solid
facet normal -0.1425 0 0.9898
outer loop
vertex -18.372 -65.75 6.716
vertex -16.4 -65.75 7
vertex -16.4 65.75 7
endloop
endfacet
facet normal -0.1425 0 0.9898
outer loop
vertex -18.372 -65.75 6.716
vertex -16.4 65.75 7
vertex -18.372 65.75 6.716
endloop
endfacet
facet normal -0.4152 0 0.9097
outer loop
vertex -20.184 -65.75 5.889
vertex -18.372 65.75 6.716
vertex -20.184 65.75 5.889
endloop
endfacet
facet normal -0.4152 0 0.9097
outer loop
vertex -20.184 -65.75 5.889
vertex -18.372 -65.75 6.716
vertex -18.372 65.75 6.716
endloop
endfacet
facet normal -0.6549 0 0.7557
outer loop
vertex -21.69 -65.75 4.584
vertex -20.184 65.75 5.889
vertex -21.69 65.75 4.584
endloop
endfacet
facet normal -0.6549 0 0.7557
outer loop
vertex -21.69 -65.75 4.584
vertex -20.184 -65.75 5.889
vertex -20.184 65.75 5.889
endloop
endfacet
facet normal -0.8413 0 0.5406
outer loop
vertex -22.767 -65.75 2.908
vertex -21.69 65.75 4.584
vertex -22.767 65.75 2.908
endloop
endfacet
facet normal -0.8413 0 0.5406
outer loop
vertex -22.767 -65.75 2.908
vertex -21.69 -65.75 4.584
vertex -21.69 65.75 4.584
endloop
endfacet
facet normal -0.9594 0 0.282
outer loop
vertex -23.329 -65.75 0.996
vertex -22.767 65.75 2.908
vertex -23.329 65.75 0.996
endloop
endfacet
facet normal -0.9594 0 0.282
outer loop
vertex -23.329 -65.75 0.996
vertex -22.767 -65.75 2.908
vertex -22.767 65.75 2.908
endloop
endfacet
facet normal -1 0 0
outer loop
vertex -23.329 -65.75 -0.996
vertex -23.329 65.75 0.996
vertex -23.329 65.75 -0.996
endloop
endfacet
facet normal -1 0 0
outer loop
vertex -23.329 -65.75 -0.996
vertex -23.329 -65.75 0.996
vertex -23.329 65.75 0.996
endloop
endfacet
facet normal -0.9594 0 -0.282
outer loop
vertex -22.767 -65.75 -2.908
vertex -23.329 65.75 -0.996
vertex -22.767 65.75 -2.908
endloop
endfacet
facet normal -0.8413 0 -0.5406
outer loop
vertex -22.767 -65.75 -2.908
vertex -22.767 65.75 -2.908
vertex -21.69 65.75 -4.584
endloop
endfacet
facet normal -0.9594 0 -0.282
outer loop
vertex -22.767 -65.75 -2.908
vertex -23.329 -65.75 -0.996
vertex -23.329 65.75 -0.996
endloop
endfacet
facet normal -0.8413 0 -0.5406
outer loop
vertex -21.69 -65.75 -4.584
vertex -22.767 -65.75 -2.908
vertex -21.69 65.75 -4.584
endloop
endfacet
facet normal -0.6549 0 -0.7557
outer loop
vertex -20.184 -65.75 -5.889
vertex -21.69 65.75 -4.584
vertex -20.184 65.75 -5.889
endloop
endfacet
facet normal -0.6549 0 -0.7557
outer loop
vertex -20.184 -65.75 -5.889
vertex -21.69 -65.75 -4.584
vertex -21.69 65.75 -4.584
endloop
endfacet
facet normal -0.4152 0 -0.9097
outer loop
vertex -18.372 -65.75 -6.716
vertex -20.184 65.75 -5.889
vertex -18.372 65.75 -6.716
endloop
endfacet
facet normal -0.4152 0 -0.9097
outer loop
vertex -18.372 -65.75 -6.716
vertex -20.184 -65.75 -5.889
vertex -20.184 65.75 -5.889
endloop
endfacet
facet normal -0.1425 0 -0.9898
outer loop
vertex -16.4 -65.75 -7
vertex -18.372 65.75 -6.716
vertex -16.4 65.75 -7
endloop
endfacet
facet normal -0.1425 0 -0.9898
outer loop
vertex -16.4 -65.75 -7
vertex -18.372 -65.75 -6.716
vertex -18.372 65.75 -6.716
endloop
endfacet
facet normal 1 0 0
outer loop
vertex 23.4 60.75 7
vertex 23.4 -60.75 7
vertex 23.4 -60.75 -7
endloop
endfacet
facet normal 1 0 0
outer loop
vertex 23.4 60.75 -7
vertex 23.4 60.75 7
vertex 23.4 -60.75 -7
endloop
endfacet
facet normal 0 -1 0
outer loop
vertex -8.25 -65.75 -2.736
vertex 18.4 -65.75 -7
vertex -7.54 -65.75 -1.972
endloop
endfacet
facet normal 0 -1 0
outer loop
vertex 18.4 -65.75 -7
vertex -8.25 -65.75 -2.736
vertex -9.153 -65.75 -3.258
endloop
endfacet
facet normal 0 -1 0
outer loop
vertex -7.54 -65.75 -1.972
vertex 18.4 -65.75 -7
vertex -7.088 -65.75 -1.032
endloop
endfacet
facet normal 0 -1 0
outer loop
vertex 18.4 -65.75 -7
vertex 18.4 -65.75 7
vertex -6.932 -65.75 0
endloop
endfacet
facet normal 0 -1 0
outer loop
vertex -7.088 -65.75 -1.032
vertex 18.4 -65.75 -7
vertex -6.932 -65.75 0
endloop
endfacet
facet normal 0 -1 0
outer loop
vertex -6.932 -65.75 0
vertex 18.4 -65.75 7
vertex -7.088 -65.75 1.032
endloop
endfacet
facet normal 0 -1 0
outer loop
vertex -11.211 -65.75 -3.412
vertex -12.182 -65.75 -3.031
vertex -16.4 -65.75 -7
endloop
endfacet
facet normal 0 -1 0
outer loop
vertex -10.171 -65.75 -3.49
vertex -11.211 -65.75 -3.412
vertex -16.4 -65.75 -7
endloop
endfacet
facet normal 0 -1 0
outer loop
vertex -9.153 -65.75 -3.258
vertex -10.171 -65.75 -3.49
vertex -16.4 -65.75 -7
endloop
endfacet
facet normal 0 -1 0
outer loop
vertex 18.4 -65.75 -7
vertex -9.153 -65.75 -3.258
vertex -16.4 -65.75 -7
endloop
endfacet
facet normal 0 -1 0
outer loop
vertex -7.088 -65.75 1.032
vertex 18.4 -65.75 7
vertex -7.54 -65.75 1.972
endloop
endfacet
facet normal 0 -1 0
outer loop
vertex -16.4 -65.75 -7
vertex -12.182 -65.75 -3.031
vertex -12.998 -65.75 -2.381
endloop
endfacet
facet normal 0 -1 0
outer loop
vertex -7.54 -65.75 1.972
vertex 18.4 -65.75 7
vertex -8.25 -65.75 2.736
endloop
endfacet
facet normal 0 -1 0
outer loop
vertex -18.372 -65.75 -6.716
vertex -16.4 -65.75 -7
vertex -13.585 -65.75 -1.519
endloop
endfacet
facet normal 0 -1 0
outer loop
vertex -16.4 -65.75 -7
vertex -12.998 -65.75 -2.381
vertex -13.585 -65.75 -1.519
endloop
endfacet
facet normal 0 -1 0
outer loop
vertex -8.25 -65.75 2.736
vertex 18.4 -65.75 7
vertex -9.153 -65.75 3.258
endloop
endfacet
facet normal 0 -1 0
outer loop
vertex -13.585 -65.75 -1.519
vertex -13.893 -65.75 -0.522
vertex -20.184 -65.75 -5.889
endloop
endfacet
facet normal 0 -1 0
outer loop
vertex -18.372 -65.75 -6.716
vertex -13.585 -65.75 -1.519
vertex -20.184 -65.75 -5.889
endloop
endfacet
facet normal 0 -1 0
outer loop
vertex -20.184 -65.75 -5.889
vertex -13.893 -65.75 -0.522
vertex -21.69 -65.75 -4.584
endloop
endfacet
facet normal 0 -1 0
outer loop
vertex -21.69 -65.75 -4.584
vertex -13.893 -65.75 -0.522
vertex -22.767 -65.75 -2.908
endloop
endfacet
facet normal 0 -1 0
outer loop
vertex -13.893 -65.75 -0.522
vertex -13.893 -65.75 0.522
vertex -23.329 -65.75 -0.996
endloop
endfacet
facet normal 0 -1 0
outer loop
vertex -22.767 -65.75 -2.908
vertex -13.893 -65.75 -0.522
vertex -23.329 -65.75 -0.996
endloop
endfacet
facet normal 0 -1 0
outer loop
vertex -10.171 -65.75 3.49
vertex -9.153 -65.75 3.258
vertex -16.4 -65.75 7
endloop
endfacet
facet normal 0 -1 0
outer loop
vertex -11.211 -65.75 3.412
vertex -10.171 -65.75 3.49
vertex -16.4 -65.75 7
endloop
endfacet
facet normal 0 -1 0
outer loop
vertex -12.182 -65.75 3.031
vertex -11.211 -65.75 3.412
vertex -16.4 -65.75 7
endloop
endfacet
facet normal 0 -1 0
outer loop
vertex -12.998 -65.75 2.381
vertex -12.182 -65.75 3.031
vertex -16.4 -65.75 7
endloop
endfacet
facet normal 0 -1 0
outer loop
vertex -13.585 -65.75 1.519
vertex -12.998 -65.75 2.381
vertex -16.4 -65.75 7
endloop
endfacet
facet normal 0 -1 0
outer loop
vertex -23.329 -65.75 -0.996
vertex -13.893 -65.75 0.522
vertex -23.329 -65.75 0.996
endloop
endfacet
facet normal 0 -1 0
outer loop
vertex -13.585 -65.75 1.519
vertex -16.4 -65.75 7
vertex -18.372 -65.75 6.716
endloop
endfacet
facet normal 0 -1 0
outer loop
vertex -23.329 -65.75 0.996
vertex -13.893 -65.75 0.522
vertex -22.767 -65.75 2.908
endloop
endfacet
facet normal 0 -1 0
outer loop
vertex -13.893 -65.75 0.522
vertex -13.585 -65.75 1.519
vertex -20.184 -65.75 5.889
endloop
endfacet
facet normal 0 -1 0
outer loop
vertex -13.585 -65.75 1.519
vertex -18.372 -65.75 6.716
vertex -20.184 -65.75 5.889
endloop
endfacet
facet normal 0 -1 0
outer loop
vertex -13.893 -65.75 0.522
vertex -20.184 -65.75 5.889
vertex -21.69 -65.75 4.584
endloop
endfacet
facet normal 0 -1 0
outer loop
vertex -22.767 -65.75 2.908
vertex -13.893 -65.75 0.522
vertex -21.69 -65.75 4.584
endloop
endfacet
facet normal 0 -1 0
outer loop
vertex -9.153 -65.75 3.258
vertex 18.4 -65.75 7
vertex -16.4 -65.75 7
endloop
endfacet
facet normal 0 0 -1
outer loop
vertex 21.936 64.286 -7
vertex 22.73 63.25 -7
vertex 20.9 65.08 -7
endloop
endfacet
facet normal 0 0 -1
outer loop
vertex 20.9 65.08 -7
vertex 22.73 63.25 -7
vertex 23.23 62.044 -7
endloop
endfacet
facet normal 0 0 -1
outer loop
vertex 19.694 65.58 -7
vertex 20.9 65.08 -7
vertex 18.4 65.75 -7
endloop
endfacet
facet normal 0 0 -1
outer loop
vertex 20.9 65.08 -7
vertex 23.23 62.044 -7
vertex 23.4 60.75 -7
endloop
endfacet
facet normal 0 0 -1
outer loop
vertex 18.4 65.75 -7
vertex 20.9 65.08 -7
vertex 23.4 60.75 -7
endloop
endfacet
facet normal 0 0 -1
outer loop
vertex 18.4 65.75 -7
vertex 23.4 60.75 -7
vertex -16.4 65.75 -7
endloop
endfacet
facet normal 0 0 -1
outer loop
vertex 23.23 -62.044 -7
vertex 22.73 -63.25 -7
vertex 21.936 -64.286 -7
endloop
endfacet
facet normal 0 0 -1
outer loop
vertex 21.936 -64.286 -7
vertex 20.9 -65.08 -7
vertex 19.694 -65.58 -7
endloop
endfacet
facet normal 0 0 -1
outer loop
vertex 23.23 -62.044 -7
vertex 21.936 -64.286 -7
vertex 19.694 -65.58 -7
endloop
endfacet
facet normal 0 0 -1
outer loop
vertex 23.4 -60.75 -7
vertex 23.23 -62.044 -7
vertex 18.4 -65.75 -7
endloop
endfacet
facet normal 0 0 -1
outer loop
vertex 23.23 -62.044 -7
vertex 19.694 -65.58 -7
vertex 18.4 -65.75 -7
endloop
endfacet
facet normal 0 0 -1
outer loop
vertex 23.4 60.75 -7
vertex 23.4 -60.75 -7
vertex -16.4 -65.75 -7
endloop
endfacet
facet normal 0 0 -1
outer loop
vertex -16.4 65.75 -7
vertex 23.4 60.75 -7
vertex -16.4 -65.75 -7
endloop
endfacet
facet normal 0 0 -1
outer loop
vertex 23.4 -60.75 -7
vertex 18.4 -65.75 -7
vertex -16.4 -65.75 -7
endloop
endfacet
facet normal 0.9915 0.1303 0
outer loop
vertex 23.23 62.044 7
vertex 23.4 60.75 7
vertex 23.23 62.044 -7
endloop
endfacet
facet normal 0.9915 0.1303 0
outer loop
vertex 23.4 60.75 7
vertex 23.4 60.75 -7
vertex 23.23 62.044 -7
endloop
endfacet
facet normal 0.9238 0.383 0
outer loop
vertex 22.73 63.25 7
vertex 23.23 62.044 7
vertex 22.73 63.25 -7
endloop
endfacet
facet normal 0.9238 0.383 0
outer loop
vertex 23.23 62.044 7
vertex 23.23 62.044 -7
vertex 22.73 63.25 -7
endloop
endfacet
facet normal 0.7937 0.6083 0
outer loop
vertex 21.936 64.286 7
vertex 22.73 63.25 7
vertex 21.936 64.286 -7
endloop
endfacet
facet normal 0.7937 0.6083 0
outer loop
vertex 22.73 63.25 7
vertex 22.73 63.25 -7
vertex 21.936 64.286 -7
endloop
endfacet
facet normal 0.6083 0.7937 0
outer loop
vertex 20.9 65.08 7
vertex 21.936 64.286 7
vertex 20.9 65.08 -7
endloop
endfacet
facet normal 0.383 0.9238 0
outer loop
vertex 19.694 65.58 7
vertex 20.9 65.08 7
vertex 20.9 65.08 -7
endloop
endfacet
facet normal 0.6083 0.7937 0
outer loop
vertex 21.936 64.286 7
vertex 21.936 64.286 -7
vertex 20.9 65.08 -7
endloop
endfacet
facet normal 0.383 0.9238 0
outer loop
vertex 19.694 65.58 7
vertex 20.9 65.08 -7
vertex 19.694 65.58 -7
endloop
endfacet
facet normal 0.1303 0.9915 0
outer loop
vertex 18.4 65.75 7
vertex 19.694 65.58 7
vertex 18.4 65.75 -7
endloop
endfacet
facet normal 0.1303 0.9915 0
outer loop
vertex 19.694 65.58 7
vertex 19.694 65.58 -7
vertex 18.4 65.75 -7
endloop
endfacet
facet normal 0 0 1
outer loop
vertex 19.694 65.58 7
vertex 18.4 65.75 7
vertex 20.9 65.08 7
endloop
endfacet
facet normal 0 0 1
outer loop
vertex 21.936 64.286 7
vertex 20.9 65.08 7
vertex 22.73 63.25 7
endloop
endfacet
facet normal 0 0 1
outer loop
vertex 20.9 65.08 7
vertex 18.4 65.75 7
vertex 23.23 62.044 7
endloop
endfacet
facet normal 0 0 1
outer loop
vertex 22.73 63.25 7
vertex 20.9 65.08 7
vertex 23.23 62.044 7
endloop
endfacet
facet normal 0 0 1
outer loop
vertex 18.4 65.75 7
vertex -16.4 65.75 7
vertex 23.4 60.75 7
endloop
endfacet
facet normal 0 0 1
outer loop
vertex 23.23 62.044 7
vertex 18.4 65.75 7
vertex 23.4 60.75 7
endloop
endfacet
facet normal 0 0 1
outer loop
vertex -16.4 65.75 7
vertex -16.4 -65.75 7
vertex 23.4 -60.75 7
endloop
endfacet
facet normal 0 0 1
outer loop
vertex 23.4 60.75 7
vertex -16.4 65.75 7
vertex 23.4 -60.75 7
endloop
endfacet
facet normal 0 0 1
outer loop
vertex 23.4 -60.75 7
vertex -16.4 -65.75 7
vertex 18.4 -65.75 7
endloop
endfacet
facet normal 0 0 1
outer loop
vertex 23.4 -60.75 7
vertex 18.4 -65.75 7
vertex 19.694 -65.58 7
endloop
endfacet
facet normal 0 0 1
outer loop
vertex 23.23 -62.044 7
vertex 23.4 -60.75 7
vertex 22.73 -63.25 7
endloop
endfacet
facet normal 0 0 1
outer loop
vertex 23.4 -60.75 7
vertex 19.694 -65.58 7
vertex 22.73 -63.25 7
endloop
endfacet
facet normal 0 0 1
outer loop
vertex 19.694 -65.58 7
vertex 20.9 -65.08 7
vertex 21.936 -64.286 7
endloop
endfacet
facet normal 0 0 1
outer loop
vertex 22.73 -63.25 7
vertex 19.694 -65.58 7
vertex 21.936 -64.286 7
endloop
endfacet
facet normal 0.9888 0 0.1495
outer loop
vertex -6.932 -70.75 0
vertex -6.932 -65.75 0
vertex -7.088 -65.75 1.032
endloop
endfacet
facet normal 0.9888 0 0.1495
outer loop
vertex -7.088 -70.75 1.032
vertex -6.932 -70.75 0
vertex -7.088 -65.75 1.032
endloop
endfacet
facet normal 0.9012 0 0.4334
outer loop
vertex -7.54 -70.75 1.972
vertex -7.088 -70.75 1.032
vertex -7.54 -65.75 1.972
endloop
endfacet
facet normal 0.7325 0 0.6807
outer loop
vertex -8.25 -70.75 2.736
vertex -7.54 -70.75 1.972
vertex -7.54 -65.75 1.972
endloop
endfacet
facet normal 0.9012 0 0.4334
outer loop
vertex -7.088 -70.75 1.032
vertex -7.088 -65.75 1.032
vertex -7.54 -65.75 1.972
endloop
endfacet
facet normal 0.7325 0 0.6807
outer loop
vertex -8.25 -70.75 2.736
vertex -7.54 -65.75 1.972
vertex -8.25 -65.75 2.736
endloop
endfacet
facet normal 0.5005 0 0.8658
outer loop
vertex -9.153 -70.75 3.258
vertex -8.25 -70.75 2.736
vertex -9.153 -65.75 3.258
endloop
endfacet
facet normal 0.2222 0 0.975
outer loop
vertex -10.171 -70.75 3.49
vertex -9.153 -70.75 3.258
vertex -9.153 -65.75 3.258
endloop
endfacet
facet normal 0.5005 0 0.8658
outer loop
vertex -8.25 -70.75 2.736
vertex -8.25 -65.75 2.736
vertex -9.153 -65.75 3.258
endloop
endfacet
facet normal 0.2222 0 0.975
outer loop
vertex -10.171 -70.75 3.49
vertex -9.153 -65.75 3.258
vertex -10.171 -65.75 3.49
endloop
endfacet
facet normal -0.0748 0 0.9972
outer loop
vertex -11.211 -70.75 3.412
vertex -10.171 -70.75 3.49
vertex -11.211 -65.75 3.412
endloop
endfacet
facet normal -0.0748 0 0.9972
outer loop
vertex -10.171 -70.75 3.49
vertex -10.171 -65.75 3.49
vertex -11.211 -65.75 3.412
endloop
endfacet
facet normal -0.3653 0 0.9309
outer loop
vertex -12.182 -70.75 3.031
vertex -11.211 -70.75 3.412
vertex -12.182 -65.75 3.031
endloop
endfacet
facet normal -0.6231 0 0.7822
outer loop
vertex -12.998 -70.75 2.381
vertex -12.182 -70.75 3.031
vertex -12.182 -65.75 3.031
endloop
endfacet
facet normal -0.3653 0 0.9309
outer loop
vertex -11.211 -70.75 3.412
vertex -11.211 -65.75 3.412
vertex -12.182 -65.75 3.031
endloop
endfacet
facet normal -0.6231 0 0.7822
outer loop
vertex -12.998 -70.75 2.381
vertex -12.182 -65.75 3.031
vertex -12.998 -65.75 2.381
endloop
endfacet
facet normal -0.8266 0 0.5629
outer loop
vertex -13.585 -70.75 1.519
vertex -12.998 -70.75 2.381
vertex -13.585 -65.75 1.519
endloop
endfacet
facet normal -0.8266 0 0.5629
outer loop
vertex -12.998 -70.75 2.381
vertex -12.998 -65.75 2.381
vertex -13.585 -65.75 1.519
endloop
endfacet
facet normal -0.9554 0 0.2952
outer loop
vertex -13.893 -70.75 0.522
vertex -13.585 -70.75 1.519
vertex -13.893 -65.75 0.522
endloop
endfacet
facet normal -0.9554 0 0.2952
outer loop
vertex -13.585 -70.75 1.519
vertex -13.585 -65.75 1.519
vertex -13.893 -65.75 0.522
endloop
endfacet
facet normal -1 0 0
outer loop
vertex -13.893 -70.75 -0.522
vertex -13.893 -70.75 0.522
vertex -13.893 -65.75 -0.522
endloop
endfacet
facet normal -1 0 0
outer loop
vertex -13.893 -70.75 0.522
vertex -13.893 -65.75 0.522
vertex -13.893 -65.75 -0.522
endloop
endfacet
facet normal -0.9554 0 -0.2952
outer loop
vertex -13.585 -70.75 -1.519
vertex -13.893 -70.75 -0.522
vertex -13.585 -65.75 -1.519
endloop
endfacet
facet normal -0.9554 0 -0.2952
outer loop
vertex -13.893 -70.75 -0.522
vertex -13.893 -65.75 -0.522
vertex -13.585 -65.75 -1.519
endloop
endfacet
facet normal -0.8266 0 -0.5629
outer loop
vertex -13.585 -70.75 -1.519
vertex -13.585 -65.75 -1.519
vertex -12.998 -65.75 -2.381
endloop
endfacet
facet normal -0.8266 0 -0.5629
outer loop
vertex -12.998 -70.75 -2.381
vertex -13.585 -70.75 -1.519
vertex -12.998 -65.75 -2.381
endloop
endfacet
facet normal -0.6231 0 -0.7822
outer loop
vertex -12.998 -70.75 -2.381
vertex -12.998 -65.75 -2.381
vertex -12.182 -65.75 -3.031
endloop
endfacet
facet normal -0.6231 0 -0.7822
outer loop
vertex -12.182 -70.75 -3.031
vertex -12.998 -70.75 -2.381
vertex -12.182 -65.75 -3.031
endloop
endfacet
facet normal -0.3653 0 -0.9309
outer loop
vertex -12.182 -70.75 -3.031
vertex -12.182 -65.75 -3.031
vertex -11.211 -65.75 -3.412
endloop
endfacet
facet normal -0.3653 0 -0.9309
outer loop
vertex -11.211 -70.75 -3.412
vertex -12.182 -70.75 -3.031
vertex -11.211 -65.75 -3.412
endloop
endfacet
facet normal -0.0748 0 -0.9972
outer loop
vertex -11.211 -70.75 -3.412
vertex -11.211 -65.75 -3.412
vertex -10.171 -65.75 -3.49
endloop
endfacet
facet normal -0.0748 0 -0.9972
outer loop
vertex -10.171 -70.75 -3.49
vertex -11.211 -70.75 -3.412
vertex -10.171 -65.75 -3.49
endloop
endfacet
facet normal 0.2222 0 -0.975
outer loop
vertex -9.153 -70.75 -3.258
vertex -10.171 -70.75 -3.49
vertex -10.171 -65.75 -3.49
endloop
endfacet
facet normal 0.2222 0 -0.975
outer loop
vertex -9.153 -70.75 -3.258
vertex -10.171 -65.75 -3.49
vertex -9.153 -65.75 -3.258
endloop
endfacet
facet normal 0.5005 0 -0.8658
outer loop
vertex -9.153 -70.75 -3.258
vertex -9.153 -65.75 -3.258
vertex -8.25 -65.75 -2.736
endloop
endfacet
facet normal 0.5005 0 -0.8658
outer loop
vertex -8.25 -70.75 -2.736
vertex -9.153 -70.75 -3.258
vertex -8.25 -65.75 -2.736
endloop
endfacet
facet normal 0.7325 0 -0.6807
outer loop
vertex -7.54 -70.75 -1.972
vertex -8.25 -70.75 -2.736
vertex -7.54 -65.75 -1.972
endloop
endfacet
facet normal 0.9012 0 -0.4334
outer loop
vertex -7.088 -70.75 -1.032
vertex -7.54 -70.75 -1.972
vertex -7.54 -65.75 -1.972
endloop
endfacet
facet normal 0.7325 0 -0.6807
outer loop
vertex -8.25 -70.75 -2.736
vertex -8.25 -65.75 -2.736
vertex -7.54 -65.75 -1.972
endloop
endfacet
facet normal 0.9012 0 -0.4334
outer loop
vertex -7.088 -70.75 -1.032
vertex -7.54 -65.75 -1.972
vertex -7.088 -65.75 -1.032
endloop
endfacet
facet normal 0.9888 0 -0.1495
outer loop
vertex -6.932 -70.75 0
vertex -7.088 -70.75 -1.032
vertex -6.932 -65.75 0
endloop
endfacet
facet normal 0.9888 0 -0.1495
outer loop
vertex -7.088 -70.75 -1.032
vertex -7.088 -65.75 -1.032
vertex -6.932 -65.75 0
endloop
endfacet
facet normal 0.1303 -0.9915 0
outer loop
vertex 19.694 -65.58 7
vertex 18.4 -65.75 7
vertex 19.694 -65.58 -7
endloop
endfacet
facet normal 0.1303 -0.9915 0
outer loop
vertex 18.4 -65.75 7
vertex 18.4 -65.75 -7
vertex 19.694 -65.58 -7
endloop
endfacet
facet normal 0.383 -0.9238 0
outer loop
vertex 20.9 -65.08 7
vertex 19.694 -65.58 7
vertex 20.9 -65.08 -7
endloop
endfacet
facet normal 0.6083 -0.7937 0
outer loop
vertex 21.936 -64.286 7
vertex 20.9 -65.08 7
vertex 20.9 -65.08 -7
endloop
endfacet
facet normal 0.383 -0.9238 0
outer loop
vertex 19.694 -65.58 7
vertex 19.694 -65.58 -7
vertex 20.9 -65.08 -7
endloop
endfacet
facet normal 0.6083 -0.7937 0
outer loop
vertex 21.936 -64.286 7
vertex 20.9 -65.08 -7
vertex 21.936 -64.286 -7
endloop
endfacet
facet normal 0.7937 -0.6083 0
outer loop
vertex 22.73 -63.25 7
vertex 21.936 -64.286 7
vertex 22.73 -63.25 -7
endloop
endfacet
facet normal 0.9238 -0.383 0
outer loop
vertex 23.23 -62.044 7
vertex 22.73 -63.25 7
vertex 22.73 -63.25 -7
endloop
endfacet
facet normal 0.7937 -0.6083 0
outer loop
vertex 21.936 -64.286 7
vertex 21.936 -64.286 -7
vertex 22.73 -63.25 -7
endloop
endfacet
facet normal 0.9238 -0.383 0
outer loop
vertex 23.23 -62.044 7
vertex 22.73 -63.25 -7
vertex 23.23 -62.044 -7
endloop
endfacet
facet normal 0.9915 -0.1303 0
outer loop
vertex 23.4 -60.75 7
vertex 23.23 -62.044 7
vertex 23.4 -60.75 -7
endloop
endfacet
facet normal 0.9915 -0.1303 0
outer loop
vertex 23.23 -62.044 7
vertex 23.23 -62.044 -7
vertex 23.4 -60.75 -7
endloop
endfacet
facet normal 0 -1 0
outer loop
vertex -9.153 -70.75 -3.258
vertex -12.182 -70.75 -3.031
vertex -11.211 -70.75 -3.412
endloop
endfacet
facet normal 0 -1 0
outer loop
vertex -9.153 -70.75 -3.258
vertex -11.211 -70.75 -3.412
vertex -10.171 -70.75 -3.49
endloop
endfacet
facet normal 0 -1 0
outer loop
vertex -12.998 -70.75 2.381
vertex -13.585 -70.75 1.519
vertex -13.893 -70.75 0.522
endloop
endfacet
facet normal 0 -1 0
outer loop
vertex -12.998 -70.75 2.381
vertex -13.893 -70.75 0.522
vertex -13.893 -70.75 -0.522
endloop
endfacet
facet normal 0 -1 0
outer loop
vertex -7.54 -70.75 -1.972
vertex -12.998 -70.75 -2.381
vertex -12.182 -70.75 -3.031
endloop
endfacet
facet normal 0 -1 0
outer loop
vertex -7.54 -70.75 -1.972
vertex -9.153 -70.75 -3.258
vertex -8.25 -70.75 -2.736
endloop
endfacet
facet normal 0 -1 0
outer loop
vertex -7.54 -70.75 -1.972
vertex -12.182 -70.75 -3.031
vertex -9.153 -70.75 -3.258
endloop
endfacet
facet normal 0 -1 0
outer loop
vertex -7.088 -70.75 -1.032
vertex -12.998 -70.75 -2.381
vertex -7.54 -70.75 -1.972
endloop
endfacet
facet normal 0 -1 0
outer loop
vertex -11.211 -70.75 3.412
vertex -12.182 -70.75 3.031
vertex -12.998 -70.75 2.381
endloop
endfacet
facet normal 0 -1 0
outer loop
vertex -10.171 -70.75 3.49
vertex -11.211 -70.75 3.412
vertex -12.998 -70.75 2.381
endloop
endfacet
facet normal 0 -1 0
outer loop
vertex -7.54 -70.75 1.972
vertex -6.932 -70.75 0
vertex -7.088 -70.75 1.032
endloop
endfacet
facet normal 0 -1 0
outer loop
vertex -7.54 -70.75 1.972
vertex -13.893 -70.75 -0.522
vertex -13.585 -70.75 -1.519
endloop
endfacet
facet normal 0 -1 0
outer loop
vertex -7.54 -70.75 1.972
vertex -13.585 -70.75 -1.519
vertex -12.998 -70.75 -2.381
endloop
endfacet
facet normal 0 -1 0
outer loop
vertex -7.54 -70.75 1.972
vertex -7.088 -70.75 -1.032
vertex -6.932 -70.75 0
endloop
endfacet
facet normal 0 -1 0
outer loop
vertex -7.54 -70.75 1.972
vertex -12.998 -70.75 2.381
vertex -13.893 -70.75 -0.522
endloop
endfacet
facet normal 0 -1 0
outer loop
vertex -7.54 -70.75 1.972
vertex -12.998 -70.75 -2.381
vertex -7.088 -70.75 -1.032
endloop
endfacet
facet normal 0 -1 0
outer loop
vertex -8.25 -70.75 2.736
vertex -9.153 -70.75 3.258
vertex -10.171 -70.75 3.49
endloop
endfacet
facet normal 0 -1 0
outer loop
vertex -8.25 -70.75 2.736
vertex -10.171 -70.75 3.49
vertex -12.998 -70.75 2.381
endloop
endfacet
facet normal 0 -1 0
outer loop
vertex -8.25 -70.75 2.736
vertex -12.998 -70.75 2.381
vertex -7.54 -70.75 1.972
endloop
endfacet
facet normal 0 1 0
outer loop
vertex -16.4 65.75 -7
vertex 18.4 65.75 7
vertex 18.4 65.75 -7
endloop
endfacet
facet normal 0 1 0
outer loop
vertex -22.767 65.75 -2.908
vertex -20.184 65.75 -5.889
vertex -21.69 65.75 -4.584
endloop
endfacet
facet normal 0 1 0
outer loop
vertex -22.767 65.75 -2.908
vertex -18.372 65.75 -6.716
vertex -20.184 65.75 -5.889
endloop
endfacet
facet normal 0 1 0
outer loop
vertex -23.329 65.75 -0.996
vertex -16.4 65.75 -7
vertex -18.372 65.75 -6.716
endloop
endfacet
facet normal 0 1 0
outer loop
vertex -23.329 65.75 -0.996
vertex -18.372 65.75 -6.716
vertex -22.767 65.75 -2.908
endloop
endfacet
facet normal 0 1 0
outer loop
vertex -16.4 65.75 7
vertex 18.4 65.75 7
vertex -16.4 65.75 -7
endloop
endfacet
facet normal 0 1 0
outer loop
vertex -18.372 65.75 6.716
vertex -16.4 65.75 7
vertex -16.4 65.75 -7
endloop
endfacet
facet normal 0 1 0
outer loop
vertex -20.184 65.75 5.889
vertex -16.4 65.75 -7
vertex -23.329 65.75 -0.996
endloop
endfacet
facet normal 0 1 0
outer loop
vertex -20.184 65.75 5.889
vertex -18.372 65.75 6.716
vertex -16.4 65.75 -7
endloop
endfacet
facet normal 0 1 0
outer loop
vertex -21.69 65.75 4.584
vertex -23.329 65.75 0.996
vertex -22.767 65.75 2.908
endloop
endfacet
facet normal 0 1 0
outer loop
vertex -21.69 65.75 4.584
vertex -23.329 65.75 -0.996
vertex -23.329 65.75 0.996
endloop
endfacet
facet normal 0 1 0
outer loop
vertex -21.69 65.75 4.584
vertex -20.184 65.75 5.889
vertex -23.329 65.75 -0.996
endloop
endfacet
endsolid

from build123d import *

# Parameters (mm, degrees)
PAD_DEPTH    = 65.75
FILLET_R     = 5
SKETCH001_R  = 3.5
PAD001_DEPTH = 5


with BuildPart() as part:
    # Sketch → Pad (new body, symmetric)
    with BuildSketch(Plane.XZ):
        with BuildLine():
            Line((-16.4, 7), (23.4, 7))
            Line((23.4, 7), (23.4, -7))
            Line((23.4, -7), (-16.4, -7))
            ThreePointArc((-16.4, 7), (-23.4, 0), (-16.4, -7))
        make_face()
    extrude(amount=PAD_DEPTH, both=True)

    # Fillet
    fillet_edges = [part.edges().sort_by_distance(p)[0] for p in [
        (23.4, -65.75, 0),
        (23.4, 65.75, 0),
    ]]
    fillet(fillet_edges, radius=FILLET_R)

    # Sketch001 (on Face6 of Fillet) → Pad001 (join)
    with BuildSketch(Plane.XZ.offset(65.75)):
        with Locations((-10.432093, 0)):
            Circle(SKETCH001_R)
    extrude(amount=PAD001_DEPTH)


solid = part.part
